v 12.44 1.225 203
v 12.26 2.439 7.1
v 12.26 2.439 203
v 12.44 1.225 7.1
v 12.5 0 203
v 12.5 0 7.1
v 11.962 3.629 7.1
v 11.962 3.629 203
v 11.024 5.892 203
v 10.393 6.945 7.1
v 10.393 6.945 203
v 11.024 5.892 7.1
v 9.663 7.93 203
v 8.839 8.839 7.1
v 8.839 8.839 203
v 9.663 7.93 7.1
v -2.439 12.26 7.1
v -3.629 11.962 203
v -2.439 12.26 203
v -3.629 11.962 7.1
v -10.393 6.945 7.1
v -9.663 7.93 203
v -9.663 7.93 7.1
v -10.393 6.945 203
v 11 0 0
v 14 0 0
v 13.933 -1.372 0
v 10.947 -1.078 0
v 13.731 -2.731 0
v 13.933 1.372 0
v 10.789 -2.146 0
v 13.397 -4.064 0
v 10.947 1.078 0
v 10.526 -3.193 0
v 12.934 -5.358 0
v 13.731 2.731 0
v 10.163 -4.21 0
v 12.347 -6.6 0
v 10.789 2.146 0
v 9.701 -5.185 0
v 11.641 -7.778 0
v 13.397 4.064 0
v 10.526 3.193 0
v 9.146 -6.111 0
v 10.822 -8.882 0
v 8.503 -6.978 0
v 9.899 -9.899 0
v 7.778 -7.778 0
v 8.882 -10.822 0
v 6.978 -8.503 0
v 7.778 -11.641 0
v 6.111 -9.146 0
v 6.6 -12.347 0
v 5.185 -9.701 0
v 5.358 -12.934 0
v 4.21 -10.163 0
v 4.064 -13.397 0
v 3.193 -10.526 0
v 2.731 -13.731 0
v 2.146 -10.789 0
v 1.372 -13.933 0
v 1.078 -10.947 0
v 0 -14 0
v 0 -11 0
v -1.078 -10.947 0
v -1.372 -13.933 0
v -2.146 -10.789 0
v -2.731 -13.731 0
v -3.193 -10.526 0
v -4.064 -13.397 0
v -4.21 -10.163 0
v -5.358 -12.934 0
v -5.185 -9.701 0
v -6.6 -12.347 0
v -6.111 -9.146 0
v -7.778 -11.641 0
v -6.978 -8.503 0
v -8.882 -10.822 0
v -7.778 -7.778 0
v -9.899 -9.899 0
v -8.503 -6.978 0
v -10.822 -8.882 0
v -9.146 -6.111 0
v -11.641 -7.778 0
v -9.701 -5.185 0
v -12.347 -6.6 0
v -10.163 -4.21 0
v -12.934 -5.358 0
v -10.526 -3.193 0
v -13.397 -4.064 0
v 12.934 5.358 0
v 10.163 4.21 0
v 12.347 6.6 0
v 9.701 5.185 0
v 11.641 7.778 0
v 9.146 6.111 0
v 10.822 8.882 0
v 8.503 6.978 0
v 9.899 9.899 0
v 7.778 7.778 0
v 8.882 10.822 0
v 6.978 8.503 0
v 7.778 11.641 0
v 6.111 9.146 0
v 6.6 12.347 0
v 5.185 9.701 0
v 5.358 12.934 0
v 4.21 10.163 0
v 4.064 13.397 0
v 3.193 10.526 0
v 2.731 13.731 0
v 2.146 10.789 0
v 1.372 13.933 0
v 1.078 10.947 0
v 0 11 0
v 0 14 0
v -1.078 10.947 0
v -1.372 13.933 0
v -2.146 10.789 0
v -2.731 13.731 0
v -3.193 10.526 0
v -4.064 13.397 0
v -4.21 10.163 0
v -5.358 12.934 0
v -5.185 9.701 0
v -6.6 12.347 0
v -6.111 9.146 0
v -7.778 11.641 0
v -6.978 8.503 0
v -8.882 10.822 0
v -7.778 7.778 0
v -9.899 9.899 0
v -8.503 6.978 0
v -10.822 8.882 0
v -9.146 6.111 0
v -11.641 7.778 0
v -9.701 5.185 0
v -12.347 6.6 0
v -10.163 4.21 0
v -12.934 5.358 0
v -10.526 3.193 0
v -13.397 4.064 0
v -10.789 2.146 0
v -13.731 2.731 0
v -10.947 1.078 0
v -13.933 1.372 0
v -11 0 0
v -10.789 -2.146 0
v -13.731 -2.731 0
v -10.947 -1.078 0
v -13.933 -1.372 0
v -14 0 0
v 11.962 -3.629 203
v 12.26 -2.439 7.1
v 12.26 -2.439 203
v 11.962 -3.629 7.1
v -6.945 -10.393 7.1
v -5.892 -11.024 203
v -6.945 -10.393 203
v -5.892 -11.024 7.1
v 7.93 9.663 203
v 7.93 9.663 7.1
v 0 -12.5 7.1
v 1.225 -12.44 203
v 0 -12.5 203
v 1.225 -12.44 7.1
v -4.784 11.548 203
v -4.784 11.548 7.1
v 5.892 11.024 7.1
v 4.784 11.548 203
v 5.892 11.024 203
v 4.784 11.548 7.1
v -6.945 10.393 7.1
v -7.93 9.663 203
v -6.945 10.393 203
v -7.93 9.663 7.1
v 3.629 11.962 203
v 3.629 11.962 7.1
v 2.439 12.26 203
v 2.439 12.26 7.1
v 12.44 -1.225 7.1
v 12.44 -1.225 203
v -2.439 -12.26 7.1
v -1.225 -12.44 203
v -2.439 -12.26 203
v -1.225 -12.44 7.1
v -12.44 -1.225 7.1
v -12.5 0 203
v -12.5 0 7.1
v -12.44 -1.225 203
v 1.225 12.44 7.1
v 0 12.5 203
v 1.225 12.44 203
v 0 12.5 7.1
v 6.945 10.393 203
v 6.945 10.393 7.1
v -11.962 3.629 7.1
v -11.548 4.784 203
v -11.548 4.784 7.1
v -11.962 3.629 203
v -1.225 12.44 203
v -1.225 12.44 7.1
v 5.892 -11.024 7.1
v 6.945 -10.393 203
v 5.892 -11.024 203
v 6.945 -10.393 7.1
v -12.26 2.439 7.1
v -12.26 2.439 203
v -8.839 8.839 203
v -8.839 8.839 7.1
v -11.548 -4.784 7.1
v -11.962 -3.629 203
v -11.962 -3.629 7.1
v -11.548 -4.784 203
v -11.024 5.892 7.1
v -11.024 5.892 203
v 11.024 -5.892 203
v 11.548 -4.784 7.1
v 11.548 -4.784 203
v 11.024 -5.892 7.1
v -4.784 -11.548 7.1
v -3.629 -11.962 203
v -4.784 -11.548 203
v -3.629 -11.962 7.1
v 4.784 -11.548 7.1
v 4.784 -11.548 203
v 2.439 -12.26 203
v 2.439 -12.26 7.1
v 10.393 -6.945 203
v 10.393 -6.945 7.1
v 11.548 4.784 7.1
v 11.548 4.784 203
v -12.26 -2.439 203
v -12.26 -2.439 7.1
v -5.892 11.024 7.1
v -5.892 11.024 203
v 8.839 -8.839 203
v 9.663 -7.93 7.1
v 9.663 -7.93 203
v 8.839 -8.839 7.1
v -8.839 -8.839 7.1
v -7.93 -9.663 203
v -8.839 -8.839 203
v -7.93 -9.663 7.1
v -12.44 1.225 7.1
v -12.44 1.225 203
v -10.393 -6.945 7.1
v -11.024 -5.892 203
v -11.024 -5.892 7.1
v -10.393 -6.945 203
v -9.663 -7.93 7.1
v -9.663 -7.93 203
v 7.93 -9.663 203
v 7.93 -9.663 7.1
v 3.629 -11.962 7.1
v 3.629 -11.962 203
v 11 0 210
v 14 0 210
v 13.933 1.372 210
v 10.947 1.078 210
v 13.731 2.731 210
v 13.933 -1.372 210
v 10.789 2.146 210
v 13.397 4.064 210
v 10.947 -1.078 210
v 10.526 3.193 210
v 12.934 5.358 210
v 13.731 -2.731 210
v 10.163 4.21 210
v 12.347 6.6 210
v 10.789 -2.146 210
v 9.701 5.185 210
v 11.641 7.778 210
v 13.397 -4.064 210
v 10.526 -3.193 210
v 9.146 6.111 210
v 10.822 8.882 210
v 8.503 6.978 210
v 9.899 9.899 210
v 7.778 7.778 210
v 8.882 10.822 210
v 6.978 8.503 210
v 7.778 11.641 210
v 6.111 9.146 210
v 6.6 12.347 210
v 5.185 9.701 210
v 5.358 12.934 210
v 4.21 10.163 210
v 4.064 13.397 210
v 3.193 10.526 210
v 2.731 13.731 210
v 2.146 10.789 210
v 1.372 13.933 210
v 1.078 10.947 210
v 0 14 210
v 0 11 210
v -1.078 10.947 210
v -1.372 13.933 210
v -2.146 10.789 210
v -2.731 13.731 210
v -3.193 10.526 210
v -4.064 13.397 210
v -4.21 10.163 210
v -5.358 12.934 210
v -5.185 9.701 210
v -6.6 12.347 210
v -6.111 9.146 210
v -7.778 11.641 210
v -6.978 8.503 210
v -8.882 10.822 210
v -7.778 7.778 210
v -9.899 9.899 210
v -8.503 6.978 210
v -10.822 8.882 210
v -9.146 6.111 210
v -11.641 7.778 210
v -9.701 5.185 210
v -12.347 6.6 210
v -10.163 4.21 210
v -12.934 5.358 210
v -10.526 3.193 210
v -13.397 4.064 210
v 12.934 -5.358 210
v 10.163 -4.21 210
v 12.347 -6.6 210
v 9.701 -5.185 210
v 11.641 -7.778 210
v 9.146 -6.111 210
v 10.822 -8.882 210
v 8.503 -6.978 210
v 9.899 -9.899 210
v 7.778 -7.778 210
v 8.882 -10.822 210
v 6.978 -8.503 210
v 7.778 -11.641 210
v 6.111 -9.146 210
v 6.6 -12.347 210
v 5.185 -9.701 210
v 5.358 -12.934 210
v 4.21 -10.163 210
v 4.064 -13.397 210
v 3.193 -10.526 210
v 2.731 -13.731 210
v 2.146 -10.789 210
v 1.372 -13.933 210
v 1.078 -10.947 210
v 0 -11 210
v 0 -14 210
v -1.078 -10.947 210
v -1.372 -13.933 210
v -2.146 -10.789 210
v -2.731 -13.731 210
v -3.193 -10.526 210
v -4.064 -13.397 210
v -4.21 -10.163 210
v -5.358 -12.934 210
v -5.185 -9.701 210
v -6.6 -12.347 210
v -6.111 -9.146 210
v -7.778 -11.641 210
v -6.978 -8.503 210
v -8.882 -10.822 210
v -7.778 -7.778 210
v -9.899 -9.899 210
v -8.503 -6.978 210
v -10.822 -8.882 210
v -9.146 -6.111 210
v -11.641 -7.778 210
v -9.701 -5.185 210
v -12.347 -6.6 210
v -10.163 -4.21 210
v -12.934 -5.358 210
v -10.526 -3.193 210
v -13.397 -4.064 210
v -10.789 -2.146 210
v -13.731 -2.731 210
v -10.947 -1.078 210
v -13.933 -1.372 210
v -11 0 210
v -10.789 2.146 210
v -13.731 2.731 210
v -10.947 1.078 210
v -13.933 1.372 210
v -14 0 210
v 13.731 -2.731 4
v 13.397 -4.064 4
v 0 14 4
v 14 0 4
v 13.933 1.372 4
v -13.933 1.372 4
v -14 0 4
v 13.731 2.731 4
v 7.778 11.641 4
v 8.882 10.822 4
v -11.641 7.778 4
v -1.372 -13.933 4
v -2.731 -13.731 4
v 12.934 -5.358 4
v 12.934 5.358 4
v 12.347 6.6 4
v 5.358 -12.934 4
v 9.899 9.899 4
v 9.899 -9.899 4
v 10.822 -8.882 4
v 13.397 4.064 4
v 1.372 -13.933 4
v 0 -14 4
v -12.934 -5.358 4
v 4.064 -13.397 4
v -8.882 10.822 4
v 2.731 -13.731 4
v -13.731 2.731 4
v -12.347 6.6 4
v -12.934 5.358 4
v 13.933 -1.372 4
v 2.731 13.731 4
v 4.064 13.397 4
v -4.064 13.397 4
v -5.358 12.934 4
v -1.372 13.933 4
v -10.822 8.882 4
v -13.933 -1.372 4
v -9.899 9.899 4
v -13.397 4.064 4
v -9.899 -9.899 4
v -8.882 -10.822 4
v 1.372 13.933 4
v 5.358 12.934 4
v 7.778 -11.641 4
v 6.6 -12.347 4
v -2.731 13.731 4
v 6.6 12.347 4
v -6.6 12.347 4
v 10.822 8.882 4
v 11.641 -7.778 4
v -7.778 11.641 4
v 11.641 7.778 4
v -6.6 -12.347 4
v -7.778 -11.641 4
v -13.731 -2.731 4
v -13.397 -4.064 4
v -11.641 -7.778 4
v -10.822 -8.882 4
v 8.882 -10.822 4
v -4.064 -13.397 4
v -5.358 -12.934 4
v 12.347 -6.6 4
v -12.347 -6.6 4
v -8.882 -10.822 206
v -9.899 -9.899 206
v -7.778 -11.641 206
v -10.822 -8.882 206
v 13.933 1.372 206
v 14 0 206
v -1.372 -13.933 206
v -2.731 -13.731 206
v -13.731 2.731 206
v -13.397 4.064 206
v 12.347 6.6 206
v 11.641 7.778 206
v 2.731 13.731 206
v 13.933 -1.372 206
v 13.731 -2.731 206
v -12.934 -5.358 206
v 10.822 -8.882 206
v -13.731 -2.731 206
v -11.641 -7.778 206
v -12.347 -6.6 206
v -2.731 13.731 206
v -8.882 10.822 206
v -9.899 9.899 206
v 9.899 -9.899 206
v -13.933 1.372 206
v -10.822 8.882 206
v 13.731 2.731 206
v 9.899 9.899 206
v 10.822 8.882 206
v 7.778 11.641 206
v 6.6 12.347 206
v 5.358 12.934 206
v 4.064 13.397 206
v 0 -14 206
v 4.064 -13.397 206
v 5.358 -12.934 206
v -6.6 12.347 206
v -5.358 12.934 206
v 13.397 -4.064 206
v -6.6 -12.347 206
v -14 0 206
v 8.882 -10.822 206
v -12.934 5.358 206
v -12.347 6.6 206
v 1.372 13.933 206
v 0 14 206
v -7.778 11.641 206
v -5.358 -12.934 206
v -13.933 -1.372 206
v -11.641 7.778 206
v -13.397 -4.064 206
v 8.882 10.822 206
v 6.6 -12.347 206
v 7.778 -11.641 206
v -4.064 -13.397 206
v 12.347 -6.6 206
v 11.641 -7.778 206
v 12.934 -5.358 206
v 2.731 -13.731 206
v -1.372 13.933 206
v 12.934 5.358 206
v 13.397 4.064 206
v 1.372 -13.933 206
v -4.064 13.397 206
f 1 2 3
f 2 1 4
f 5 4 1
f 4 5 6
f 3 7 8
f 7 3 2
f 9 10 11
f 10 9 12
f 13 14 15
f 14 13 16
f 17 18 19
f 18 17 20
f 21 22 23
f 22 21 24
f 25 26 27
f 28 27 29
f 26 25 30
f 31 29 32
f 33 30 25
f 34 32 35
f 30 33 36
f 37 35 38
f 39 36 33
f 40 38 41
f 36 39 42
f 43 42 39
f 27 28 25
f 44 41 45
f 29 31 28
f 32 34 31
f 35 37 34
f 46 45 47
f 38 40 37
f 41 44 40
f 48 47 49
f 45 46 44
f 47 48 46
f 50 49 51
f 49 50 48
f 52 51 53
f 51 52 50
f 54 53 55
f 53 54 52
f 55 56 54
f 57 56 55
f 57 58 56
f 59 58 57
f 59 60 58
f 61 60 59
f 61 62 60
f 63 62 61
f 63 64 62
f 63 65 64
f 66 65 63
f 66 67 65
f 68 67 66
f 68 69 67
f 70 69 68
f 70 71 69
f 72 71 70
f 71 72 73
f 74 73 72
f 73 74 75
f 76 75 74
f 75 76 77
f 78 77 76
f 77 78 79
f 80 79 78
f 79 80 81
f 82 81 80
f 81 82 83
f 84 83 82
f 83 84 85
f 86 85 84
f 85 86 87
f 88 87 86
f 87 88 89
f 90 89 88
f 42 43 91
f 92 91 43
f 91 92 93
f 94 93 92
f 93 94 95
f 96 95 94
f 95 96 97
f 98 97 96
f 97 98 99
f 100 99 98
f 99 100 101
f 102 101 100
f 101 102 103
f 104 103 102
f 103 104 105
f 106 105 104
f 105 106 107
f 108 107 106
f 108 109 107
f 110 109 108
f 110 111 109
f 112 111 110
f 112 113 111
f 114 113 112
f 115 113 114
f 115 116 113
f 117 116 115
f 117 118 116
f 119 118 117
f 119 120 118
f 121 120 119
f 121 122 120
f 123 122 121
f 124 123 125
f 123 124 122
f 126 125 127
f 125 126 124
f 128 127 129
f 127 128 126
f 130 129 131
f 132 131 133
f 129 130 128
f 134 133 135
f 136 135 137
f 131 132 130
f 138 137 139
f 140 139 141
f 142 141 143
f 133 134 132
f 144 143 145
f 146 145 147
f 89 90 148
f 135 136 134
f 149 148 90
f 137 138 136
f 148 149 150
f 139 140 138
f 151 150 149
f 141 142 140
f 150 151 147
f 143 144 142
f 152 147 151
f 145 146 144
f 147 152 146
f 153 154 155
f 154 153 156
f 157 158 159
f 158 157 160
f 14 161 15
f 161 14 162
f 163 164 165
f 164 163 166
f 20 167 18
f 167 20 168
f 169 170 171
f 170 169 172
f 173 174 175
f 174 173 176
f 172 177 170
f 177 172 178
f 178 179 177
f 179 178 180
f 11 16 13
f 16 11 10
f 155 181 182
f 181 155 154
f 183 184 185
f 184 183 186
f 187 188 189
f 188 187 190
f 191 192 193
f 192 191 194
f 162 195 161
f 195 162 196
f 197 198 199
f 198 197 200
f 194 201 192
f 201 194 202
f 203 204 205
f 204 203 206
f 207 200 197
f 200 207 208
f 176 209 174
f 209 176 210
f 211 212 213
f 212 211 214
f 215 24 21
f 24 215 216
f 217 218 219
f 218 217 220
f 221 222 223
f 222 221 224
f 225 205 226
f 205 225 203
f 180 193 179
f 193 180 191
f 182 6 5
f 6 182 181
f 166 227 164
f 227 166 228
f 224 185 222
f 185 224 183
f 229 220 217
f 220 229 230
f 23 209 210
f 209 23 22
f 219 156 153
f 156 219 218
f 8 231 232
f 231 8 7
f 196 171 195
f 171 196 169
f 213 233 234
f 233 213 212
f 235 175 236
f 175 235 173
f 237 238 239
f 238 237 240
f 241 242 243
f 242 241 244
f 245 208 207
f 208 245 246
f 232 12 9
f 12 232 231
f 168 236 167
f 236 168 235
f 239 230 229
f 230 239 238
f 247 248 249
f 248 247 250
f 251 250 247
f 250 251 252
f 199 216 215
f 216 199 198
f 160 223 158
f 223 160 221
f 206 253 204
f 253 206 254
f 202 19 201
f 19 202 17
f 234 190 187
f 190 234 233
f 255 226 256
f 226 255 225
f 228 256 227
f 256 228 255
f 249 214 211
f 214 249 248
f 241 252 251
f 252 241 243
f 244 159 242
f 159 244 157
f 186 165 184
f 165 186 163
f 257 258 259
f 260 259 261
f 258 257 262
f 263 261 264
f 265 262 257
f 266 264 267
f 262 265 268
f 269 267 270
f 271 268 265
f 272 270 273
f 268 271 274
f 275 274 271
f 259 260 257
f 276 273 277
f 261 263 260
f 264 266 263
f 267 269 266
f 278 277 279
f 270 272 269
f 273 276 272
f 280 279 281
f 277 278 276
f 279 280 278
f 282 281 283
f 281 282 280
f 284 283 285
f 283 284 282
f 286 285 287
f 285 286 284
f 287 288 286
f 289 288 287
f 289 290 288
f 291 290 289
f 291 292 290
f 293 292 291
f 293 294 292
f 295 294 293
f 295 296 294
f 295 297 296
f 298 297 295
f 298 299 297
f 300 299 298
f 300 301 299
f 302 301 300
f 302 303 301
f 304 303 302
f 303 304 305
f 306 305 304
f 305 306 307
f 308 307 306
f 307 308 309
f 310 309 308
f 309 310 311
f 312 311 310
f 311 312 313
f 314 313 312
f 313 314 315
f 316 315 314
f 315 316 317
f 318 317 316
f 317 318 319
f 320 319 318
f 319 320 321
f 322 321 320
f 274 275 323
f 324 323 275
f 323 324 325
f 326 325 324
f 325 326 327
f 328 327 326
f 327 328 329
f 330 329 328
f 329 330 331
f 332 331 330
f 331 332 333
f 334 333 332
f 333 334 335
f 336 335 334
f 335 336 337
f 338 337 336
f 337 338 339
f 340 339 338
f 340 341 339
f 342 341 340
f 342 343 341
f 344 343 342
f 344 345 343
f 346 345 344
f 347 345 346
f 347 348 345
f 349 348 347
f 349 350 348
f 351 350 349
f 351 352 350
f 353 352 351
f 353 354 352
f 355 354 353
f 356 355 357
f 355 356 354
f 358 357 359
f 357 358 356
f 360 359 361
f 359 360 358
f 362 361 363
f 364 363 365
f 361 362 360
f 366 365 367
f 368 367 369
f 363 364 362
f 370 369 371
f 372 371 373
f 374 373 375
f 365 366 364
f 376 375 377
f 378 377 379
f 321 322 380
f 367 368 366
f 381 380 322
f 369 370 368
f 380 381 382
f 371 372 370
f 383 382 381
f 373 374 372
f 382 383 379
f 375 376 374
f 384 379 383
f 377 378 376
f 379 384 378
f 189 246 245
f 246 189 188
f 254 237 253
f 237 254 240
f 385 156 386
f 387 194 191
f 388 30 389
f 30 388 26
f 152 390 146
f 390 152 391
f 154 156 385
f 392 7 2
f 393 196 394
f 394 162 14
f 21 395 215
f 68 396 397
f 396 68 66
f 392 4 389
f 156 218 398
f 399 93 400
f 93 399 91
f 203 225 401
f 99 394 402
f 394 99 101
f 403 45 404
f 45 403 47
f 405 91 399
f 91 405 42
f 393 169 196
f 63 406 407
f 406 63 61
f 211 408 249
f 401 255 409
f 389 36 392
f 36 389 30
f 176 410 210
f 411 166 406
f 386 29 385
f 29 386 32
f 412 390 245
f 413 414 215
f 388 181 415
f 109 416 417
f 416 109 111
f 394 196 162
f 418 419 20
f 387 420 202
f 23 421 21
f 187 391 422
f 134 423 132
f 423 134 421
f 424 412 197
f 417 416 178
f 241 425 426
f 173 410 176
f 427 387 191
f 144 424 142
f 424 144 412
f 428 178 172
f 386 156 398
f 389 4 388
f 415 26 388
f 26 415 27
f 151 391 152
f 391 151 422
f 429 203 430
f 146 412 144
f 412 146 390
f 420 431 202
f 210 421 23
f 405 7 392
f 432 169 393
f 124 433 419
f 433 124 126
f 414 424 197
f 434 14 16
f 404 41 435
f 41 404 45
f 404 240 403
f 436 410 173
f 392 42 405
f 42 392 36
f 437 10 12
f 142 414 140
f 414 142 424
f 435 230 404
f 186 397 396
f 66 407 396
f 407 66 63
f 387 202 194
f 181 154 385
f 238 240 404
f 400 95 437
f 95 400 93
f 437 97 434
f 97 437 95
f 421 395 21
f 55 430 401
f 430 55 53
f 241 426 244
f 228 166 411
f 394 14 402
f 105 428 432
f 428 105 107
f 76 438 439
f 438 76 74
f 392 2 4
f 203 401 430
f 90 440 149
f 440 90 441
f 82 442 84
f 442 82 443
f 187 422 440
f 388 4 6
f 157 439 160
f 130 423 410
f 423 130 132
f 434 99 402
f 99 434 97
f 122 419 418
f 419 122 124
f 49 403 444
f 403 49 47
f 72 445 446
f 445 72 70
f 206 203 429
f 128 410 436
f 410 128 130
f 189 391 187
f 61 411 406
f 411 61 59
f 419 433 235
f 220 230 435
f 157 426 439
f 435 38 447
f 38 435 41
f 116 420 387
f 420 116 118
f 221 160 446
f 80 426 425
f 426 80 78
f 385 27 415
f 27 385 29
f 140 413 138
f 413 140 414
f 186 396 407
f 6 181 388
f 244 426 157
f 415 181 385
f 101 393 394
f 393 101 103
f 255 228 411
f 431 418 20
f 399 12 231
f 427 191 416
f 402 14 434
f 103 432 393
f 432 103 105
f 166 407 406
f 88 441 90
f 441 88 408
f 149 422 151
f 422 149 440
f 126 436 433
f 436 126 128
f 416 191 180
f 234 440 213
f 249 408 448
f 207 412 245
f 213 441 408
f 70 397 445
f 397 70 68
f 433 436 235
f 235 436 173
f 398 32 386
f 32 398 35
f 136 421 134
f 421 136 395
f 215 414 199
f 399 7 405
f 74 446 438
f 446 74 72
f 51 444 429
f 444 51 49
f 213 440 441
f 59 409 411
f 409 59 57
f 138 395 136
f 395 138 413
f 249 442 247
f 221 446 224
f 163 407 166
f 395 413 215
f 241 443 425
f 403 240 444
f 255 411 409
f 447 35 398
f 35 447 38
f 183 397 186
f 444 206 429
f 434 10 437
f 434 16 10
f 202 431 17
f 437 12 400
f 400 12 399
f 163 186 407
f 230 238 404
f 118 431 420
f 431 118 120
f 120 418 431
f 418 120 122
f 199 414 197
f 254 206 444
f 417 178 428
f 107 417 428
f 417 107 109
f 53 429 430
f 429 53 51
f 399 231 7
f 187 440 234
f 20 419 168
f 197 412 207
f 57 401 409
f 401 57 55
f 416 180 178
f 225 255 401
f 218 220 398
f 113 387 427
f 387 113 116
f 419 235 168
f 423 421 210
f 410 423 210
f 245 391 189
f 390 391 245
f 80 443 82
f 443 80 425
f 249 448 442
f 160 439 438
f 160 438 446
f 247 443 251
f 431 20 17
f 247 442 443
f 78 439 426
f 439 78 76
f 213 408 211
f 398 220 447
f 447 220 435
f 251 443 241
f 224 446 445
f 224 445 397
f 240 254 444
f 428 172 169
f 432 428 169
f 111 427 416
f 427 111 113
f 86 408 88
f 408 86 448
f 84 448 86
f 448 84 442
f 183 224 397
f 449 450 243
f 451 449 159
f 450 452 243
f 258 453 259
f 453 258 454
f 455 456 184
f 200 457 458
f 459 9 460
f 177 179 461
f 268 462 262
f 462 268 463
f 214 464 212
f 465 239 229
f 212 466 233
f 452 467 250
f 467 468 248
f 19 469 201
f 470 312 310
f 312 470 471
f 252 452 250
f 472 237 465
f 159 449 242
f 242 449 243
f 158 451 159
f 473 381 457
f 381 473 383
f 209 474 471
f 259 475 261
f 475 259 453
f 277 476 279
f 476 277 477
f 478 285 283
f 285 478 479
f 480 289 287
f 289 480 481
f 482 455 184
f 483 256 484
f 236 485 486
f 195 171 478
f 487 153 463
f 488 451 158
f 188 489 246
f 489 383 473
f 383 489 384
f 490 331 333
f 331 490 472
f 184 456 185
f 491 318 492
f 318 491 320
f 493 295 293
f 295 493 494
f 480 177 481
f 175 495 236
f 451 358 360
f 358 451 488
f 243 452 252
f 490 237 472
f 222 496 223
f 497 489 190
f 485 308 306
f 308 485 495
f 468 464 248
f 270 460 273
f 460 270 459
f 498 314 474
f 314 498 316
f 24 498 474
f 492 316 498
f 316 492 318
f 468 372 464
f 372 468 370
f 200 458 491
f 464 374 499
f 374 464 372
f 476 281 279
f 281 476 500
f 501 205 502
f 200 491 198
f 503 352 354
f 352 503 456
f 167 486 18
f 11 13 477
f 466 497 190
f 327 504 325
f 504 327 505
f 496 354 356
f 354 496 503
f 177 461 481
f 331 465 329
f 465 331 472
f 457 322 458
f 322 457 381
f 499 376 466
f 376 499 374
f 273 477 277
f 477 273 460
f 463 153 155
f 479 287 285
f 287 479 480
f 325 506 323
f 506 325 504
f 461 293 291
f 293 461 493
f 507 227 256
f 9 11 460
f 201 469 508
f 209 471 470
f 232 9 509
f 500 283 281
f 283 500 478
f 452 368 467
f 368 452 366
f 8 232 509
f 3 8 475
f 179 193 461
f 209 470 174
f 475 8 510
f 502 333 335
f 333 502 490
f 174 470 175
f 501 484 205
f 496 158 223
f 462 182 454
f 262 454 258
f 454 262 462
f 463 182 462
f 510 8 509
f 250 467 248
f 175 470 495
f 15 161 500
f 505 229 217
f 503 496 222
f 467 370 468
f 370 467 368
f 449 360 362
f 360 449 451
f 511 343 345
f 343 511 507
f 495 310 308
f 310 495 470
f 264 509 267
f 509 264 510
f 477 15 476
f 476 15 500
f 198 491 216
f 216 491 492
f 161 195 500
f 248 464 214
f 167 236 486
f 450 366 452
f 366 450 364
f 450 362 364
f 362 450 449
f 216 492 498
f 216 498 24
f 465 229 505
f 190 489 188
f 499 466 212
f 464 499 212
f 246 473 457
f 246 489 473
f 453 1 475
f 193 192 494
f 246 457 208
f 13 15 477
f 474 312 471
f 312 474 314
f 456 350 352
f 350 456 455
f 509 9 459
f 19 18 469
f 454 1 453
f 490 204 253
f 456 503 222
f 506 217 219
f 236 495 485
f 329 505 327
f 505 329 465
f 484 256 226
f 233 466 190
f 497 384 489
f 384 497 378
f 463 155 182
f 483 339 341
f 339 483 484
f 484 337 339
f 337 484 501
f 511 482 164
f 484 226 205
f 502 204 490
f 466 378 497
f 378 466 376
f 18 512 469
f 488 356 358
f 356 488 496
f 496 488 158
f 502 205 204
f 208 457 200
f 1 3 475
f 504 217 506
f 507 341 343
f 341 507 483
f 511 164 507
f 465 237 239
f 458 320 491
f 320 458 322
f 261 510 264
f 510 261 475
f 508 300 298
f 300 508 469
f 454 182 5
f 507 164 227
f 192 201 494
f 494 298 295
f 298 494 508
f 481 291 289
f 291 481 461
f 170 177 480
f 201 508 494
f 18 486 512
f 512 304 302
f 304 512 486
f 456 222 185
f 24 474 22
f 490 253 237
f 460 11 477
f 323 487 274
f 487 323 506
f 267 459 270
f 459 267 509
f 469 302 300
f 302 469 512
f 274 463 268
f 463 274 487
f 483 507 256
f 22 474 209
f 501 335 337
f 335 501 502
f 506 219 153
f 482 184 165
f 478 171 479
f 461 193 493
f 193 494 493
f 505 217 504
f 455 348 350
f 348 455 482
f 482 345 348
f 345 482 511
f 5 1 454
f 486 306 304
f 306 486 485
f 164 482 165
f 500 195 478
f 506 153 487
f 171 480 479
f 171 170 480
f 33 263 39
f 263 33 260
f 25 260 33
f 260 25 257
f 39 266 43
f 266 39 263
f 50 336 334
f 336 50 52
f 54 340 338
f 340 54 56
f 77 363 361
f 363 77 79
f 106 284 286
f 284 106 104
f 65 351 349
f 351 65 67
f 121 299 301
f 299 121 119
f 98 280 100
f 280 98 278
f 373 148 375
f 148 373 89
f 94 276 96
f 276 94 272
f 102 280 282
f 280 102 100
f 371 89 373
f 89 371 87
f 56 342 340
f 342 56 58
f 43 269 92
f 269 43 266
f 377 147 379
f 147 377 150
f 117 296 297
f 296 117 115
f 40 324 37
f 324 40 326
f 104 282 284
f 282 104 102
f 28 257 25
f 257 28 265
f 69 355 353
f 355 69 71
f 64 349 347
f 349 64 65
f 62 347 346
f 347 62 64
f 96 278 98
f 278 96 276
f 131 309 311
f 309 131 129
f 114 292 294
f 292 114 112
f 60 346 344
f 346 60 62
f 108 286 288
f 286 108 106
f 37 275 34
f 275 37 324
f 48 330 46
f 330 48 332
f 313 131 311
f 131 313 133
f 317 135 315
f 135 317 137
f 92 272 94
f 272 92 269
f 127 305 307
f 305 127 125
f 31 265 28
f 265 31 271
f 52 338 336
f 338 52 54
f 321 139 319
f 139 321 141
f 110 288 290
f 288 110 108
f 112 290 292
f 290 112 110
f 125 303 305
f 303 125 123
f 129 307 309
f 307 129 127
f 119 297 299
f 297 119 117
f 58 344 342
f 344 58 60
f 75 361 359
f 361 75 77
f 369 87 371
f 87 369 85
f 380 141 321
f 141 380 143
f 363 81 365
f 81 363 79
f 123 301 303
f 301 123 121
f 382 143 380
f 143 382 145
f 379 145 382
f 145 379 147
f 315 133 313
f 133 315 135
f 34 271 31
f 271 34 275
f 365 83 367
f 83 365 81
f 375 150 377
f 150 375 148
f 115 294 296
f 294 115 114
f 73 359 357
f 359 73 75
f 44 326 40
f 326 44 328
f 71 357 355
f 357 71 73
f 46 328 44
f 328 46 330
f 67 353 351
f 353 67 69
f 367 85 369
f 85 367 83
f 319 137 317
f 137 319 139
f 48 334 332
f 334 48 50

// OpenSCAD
/*
  filament_rack_bar.scad

  Bar for GOEWS filament rack saddles.

  Length modes:
    bar_length_mode = "mm"     -> use bar_length_mm directly
    bar_length_mode = "steps"  -> use bar_length_steps

  Step lengths:
    1   == 124mm
    1.5 == halfway between 124mm and 210mm == 167mm
    2   == 210mm
*/

/* [Bar] */

bar_diameter = 25;
bar_thickness = 3;
bar_end_diameter = 28;
bar_end_length = 4;

/* [Length] */

// "mm" or "steps"
bar_length_mode = "steps";

// Used when bar_length_mode == "mm"
bar_length_mm = 210;

// Used when bar_length_mode == "steps"
// Valid intended values: 1, 1.5, 2
bar_length_steps = 2;

// Step calibration
bar_length_1_step = 124;
bar_length_2_steps = 210;

function bar_length_from_steps(steps) =
  bar_length_1_step
  + ((steps - 1) * (bar_length_2_steps - bar_length_1_step));

function resolved_bar_length() =
  bar_length_mode == "steps"
    ? bar_length_from_steps(bar_length_steps)
    : bar_length_mm;

module goews_filament_rack_bar(d, d2, t, l, l2) {
  $fn = 64;
  delta = d2 - d;

  difference() {
    union() {
      cylinder(d=d, h=l);

      hull() {
        cylinder(d=d2, h=l2);
        translate([0, 0, l2 + delta])
          cylinder(d=d, h=0.1);
      }

      hull() {
        translate([0, 0, l - l2])
          cylinder(d=d2, h=l2);
        translate([0, 0, l - l2 - delta])
          cylinder(d=d, h=0.1);
      }
    }

    translate([0, 0, -1])
      cylinder(d=d - t, h=l + 2);
  }
}

goews_filament_rack_bar(
  bar_diameter,
  bar_end_diameter,
  bar_thickness,
  resolved_bar_length(),
  bar_end_length
);
